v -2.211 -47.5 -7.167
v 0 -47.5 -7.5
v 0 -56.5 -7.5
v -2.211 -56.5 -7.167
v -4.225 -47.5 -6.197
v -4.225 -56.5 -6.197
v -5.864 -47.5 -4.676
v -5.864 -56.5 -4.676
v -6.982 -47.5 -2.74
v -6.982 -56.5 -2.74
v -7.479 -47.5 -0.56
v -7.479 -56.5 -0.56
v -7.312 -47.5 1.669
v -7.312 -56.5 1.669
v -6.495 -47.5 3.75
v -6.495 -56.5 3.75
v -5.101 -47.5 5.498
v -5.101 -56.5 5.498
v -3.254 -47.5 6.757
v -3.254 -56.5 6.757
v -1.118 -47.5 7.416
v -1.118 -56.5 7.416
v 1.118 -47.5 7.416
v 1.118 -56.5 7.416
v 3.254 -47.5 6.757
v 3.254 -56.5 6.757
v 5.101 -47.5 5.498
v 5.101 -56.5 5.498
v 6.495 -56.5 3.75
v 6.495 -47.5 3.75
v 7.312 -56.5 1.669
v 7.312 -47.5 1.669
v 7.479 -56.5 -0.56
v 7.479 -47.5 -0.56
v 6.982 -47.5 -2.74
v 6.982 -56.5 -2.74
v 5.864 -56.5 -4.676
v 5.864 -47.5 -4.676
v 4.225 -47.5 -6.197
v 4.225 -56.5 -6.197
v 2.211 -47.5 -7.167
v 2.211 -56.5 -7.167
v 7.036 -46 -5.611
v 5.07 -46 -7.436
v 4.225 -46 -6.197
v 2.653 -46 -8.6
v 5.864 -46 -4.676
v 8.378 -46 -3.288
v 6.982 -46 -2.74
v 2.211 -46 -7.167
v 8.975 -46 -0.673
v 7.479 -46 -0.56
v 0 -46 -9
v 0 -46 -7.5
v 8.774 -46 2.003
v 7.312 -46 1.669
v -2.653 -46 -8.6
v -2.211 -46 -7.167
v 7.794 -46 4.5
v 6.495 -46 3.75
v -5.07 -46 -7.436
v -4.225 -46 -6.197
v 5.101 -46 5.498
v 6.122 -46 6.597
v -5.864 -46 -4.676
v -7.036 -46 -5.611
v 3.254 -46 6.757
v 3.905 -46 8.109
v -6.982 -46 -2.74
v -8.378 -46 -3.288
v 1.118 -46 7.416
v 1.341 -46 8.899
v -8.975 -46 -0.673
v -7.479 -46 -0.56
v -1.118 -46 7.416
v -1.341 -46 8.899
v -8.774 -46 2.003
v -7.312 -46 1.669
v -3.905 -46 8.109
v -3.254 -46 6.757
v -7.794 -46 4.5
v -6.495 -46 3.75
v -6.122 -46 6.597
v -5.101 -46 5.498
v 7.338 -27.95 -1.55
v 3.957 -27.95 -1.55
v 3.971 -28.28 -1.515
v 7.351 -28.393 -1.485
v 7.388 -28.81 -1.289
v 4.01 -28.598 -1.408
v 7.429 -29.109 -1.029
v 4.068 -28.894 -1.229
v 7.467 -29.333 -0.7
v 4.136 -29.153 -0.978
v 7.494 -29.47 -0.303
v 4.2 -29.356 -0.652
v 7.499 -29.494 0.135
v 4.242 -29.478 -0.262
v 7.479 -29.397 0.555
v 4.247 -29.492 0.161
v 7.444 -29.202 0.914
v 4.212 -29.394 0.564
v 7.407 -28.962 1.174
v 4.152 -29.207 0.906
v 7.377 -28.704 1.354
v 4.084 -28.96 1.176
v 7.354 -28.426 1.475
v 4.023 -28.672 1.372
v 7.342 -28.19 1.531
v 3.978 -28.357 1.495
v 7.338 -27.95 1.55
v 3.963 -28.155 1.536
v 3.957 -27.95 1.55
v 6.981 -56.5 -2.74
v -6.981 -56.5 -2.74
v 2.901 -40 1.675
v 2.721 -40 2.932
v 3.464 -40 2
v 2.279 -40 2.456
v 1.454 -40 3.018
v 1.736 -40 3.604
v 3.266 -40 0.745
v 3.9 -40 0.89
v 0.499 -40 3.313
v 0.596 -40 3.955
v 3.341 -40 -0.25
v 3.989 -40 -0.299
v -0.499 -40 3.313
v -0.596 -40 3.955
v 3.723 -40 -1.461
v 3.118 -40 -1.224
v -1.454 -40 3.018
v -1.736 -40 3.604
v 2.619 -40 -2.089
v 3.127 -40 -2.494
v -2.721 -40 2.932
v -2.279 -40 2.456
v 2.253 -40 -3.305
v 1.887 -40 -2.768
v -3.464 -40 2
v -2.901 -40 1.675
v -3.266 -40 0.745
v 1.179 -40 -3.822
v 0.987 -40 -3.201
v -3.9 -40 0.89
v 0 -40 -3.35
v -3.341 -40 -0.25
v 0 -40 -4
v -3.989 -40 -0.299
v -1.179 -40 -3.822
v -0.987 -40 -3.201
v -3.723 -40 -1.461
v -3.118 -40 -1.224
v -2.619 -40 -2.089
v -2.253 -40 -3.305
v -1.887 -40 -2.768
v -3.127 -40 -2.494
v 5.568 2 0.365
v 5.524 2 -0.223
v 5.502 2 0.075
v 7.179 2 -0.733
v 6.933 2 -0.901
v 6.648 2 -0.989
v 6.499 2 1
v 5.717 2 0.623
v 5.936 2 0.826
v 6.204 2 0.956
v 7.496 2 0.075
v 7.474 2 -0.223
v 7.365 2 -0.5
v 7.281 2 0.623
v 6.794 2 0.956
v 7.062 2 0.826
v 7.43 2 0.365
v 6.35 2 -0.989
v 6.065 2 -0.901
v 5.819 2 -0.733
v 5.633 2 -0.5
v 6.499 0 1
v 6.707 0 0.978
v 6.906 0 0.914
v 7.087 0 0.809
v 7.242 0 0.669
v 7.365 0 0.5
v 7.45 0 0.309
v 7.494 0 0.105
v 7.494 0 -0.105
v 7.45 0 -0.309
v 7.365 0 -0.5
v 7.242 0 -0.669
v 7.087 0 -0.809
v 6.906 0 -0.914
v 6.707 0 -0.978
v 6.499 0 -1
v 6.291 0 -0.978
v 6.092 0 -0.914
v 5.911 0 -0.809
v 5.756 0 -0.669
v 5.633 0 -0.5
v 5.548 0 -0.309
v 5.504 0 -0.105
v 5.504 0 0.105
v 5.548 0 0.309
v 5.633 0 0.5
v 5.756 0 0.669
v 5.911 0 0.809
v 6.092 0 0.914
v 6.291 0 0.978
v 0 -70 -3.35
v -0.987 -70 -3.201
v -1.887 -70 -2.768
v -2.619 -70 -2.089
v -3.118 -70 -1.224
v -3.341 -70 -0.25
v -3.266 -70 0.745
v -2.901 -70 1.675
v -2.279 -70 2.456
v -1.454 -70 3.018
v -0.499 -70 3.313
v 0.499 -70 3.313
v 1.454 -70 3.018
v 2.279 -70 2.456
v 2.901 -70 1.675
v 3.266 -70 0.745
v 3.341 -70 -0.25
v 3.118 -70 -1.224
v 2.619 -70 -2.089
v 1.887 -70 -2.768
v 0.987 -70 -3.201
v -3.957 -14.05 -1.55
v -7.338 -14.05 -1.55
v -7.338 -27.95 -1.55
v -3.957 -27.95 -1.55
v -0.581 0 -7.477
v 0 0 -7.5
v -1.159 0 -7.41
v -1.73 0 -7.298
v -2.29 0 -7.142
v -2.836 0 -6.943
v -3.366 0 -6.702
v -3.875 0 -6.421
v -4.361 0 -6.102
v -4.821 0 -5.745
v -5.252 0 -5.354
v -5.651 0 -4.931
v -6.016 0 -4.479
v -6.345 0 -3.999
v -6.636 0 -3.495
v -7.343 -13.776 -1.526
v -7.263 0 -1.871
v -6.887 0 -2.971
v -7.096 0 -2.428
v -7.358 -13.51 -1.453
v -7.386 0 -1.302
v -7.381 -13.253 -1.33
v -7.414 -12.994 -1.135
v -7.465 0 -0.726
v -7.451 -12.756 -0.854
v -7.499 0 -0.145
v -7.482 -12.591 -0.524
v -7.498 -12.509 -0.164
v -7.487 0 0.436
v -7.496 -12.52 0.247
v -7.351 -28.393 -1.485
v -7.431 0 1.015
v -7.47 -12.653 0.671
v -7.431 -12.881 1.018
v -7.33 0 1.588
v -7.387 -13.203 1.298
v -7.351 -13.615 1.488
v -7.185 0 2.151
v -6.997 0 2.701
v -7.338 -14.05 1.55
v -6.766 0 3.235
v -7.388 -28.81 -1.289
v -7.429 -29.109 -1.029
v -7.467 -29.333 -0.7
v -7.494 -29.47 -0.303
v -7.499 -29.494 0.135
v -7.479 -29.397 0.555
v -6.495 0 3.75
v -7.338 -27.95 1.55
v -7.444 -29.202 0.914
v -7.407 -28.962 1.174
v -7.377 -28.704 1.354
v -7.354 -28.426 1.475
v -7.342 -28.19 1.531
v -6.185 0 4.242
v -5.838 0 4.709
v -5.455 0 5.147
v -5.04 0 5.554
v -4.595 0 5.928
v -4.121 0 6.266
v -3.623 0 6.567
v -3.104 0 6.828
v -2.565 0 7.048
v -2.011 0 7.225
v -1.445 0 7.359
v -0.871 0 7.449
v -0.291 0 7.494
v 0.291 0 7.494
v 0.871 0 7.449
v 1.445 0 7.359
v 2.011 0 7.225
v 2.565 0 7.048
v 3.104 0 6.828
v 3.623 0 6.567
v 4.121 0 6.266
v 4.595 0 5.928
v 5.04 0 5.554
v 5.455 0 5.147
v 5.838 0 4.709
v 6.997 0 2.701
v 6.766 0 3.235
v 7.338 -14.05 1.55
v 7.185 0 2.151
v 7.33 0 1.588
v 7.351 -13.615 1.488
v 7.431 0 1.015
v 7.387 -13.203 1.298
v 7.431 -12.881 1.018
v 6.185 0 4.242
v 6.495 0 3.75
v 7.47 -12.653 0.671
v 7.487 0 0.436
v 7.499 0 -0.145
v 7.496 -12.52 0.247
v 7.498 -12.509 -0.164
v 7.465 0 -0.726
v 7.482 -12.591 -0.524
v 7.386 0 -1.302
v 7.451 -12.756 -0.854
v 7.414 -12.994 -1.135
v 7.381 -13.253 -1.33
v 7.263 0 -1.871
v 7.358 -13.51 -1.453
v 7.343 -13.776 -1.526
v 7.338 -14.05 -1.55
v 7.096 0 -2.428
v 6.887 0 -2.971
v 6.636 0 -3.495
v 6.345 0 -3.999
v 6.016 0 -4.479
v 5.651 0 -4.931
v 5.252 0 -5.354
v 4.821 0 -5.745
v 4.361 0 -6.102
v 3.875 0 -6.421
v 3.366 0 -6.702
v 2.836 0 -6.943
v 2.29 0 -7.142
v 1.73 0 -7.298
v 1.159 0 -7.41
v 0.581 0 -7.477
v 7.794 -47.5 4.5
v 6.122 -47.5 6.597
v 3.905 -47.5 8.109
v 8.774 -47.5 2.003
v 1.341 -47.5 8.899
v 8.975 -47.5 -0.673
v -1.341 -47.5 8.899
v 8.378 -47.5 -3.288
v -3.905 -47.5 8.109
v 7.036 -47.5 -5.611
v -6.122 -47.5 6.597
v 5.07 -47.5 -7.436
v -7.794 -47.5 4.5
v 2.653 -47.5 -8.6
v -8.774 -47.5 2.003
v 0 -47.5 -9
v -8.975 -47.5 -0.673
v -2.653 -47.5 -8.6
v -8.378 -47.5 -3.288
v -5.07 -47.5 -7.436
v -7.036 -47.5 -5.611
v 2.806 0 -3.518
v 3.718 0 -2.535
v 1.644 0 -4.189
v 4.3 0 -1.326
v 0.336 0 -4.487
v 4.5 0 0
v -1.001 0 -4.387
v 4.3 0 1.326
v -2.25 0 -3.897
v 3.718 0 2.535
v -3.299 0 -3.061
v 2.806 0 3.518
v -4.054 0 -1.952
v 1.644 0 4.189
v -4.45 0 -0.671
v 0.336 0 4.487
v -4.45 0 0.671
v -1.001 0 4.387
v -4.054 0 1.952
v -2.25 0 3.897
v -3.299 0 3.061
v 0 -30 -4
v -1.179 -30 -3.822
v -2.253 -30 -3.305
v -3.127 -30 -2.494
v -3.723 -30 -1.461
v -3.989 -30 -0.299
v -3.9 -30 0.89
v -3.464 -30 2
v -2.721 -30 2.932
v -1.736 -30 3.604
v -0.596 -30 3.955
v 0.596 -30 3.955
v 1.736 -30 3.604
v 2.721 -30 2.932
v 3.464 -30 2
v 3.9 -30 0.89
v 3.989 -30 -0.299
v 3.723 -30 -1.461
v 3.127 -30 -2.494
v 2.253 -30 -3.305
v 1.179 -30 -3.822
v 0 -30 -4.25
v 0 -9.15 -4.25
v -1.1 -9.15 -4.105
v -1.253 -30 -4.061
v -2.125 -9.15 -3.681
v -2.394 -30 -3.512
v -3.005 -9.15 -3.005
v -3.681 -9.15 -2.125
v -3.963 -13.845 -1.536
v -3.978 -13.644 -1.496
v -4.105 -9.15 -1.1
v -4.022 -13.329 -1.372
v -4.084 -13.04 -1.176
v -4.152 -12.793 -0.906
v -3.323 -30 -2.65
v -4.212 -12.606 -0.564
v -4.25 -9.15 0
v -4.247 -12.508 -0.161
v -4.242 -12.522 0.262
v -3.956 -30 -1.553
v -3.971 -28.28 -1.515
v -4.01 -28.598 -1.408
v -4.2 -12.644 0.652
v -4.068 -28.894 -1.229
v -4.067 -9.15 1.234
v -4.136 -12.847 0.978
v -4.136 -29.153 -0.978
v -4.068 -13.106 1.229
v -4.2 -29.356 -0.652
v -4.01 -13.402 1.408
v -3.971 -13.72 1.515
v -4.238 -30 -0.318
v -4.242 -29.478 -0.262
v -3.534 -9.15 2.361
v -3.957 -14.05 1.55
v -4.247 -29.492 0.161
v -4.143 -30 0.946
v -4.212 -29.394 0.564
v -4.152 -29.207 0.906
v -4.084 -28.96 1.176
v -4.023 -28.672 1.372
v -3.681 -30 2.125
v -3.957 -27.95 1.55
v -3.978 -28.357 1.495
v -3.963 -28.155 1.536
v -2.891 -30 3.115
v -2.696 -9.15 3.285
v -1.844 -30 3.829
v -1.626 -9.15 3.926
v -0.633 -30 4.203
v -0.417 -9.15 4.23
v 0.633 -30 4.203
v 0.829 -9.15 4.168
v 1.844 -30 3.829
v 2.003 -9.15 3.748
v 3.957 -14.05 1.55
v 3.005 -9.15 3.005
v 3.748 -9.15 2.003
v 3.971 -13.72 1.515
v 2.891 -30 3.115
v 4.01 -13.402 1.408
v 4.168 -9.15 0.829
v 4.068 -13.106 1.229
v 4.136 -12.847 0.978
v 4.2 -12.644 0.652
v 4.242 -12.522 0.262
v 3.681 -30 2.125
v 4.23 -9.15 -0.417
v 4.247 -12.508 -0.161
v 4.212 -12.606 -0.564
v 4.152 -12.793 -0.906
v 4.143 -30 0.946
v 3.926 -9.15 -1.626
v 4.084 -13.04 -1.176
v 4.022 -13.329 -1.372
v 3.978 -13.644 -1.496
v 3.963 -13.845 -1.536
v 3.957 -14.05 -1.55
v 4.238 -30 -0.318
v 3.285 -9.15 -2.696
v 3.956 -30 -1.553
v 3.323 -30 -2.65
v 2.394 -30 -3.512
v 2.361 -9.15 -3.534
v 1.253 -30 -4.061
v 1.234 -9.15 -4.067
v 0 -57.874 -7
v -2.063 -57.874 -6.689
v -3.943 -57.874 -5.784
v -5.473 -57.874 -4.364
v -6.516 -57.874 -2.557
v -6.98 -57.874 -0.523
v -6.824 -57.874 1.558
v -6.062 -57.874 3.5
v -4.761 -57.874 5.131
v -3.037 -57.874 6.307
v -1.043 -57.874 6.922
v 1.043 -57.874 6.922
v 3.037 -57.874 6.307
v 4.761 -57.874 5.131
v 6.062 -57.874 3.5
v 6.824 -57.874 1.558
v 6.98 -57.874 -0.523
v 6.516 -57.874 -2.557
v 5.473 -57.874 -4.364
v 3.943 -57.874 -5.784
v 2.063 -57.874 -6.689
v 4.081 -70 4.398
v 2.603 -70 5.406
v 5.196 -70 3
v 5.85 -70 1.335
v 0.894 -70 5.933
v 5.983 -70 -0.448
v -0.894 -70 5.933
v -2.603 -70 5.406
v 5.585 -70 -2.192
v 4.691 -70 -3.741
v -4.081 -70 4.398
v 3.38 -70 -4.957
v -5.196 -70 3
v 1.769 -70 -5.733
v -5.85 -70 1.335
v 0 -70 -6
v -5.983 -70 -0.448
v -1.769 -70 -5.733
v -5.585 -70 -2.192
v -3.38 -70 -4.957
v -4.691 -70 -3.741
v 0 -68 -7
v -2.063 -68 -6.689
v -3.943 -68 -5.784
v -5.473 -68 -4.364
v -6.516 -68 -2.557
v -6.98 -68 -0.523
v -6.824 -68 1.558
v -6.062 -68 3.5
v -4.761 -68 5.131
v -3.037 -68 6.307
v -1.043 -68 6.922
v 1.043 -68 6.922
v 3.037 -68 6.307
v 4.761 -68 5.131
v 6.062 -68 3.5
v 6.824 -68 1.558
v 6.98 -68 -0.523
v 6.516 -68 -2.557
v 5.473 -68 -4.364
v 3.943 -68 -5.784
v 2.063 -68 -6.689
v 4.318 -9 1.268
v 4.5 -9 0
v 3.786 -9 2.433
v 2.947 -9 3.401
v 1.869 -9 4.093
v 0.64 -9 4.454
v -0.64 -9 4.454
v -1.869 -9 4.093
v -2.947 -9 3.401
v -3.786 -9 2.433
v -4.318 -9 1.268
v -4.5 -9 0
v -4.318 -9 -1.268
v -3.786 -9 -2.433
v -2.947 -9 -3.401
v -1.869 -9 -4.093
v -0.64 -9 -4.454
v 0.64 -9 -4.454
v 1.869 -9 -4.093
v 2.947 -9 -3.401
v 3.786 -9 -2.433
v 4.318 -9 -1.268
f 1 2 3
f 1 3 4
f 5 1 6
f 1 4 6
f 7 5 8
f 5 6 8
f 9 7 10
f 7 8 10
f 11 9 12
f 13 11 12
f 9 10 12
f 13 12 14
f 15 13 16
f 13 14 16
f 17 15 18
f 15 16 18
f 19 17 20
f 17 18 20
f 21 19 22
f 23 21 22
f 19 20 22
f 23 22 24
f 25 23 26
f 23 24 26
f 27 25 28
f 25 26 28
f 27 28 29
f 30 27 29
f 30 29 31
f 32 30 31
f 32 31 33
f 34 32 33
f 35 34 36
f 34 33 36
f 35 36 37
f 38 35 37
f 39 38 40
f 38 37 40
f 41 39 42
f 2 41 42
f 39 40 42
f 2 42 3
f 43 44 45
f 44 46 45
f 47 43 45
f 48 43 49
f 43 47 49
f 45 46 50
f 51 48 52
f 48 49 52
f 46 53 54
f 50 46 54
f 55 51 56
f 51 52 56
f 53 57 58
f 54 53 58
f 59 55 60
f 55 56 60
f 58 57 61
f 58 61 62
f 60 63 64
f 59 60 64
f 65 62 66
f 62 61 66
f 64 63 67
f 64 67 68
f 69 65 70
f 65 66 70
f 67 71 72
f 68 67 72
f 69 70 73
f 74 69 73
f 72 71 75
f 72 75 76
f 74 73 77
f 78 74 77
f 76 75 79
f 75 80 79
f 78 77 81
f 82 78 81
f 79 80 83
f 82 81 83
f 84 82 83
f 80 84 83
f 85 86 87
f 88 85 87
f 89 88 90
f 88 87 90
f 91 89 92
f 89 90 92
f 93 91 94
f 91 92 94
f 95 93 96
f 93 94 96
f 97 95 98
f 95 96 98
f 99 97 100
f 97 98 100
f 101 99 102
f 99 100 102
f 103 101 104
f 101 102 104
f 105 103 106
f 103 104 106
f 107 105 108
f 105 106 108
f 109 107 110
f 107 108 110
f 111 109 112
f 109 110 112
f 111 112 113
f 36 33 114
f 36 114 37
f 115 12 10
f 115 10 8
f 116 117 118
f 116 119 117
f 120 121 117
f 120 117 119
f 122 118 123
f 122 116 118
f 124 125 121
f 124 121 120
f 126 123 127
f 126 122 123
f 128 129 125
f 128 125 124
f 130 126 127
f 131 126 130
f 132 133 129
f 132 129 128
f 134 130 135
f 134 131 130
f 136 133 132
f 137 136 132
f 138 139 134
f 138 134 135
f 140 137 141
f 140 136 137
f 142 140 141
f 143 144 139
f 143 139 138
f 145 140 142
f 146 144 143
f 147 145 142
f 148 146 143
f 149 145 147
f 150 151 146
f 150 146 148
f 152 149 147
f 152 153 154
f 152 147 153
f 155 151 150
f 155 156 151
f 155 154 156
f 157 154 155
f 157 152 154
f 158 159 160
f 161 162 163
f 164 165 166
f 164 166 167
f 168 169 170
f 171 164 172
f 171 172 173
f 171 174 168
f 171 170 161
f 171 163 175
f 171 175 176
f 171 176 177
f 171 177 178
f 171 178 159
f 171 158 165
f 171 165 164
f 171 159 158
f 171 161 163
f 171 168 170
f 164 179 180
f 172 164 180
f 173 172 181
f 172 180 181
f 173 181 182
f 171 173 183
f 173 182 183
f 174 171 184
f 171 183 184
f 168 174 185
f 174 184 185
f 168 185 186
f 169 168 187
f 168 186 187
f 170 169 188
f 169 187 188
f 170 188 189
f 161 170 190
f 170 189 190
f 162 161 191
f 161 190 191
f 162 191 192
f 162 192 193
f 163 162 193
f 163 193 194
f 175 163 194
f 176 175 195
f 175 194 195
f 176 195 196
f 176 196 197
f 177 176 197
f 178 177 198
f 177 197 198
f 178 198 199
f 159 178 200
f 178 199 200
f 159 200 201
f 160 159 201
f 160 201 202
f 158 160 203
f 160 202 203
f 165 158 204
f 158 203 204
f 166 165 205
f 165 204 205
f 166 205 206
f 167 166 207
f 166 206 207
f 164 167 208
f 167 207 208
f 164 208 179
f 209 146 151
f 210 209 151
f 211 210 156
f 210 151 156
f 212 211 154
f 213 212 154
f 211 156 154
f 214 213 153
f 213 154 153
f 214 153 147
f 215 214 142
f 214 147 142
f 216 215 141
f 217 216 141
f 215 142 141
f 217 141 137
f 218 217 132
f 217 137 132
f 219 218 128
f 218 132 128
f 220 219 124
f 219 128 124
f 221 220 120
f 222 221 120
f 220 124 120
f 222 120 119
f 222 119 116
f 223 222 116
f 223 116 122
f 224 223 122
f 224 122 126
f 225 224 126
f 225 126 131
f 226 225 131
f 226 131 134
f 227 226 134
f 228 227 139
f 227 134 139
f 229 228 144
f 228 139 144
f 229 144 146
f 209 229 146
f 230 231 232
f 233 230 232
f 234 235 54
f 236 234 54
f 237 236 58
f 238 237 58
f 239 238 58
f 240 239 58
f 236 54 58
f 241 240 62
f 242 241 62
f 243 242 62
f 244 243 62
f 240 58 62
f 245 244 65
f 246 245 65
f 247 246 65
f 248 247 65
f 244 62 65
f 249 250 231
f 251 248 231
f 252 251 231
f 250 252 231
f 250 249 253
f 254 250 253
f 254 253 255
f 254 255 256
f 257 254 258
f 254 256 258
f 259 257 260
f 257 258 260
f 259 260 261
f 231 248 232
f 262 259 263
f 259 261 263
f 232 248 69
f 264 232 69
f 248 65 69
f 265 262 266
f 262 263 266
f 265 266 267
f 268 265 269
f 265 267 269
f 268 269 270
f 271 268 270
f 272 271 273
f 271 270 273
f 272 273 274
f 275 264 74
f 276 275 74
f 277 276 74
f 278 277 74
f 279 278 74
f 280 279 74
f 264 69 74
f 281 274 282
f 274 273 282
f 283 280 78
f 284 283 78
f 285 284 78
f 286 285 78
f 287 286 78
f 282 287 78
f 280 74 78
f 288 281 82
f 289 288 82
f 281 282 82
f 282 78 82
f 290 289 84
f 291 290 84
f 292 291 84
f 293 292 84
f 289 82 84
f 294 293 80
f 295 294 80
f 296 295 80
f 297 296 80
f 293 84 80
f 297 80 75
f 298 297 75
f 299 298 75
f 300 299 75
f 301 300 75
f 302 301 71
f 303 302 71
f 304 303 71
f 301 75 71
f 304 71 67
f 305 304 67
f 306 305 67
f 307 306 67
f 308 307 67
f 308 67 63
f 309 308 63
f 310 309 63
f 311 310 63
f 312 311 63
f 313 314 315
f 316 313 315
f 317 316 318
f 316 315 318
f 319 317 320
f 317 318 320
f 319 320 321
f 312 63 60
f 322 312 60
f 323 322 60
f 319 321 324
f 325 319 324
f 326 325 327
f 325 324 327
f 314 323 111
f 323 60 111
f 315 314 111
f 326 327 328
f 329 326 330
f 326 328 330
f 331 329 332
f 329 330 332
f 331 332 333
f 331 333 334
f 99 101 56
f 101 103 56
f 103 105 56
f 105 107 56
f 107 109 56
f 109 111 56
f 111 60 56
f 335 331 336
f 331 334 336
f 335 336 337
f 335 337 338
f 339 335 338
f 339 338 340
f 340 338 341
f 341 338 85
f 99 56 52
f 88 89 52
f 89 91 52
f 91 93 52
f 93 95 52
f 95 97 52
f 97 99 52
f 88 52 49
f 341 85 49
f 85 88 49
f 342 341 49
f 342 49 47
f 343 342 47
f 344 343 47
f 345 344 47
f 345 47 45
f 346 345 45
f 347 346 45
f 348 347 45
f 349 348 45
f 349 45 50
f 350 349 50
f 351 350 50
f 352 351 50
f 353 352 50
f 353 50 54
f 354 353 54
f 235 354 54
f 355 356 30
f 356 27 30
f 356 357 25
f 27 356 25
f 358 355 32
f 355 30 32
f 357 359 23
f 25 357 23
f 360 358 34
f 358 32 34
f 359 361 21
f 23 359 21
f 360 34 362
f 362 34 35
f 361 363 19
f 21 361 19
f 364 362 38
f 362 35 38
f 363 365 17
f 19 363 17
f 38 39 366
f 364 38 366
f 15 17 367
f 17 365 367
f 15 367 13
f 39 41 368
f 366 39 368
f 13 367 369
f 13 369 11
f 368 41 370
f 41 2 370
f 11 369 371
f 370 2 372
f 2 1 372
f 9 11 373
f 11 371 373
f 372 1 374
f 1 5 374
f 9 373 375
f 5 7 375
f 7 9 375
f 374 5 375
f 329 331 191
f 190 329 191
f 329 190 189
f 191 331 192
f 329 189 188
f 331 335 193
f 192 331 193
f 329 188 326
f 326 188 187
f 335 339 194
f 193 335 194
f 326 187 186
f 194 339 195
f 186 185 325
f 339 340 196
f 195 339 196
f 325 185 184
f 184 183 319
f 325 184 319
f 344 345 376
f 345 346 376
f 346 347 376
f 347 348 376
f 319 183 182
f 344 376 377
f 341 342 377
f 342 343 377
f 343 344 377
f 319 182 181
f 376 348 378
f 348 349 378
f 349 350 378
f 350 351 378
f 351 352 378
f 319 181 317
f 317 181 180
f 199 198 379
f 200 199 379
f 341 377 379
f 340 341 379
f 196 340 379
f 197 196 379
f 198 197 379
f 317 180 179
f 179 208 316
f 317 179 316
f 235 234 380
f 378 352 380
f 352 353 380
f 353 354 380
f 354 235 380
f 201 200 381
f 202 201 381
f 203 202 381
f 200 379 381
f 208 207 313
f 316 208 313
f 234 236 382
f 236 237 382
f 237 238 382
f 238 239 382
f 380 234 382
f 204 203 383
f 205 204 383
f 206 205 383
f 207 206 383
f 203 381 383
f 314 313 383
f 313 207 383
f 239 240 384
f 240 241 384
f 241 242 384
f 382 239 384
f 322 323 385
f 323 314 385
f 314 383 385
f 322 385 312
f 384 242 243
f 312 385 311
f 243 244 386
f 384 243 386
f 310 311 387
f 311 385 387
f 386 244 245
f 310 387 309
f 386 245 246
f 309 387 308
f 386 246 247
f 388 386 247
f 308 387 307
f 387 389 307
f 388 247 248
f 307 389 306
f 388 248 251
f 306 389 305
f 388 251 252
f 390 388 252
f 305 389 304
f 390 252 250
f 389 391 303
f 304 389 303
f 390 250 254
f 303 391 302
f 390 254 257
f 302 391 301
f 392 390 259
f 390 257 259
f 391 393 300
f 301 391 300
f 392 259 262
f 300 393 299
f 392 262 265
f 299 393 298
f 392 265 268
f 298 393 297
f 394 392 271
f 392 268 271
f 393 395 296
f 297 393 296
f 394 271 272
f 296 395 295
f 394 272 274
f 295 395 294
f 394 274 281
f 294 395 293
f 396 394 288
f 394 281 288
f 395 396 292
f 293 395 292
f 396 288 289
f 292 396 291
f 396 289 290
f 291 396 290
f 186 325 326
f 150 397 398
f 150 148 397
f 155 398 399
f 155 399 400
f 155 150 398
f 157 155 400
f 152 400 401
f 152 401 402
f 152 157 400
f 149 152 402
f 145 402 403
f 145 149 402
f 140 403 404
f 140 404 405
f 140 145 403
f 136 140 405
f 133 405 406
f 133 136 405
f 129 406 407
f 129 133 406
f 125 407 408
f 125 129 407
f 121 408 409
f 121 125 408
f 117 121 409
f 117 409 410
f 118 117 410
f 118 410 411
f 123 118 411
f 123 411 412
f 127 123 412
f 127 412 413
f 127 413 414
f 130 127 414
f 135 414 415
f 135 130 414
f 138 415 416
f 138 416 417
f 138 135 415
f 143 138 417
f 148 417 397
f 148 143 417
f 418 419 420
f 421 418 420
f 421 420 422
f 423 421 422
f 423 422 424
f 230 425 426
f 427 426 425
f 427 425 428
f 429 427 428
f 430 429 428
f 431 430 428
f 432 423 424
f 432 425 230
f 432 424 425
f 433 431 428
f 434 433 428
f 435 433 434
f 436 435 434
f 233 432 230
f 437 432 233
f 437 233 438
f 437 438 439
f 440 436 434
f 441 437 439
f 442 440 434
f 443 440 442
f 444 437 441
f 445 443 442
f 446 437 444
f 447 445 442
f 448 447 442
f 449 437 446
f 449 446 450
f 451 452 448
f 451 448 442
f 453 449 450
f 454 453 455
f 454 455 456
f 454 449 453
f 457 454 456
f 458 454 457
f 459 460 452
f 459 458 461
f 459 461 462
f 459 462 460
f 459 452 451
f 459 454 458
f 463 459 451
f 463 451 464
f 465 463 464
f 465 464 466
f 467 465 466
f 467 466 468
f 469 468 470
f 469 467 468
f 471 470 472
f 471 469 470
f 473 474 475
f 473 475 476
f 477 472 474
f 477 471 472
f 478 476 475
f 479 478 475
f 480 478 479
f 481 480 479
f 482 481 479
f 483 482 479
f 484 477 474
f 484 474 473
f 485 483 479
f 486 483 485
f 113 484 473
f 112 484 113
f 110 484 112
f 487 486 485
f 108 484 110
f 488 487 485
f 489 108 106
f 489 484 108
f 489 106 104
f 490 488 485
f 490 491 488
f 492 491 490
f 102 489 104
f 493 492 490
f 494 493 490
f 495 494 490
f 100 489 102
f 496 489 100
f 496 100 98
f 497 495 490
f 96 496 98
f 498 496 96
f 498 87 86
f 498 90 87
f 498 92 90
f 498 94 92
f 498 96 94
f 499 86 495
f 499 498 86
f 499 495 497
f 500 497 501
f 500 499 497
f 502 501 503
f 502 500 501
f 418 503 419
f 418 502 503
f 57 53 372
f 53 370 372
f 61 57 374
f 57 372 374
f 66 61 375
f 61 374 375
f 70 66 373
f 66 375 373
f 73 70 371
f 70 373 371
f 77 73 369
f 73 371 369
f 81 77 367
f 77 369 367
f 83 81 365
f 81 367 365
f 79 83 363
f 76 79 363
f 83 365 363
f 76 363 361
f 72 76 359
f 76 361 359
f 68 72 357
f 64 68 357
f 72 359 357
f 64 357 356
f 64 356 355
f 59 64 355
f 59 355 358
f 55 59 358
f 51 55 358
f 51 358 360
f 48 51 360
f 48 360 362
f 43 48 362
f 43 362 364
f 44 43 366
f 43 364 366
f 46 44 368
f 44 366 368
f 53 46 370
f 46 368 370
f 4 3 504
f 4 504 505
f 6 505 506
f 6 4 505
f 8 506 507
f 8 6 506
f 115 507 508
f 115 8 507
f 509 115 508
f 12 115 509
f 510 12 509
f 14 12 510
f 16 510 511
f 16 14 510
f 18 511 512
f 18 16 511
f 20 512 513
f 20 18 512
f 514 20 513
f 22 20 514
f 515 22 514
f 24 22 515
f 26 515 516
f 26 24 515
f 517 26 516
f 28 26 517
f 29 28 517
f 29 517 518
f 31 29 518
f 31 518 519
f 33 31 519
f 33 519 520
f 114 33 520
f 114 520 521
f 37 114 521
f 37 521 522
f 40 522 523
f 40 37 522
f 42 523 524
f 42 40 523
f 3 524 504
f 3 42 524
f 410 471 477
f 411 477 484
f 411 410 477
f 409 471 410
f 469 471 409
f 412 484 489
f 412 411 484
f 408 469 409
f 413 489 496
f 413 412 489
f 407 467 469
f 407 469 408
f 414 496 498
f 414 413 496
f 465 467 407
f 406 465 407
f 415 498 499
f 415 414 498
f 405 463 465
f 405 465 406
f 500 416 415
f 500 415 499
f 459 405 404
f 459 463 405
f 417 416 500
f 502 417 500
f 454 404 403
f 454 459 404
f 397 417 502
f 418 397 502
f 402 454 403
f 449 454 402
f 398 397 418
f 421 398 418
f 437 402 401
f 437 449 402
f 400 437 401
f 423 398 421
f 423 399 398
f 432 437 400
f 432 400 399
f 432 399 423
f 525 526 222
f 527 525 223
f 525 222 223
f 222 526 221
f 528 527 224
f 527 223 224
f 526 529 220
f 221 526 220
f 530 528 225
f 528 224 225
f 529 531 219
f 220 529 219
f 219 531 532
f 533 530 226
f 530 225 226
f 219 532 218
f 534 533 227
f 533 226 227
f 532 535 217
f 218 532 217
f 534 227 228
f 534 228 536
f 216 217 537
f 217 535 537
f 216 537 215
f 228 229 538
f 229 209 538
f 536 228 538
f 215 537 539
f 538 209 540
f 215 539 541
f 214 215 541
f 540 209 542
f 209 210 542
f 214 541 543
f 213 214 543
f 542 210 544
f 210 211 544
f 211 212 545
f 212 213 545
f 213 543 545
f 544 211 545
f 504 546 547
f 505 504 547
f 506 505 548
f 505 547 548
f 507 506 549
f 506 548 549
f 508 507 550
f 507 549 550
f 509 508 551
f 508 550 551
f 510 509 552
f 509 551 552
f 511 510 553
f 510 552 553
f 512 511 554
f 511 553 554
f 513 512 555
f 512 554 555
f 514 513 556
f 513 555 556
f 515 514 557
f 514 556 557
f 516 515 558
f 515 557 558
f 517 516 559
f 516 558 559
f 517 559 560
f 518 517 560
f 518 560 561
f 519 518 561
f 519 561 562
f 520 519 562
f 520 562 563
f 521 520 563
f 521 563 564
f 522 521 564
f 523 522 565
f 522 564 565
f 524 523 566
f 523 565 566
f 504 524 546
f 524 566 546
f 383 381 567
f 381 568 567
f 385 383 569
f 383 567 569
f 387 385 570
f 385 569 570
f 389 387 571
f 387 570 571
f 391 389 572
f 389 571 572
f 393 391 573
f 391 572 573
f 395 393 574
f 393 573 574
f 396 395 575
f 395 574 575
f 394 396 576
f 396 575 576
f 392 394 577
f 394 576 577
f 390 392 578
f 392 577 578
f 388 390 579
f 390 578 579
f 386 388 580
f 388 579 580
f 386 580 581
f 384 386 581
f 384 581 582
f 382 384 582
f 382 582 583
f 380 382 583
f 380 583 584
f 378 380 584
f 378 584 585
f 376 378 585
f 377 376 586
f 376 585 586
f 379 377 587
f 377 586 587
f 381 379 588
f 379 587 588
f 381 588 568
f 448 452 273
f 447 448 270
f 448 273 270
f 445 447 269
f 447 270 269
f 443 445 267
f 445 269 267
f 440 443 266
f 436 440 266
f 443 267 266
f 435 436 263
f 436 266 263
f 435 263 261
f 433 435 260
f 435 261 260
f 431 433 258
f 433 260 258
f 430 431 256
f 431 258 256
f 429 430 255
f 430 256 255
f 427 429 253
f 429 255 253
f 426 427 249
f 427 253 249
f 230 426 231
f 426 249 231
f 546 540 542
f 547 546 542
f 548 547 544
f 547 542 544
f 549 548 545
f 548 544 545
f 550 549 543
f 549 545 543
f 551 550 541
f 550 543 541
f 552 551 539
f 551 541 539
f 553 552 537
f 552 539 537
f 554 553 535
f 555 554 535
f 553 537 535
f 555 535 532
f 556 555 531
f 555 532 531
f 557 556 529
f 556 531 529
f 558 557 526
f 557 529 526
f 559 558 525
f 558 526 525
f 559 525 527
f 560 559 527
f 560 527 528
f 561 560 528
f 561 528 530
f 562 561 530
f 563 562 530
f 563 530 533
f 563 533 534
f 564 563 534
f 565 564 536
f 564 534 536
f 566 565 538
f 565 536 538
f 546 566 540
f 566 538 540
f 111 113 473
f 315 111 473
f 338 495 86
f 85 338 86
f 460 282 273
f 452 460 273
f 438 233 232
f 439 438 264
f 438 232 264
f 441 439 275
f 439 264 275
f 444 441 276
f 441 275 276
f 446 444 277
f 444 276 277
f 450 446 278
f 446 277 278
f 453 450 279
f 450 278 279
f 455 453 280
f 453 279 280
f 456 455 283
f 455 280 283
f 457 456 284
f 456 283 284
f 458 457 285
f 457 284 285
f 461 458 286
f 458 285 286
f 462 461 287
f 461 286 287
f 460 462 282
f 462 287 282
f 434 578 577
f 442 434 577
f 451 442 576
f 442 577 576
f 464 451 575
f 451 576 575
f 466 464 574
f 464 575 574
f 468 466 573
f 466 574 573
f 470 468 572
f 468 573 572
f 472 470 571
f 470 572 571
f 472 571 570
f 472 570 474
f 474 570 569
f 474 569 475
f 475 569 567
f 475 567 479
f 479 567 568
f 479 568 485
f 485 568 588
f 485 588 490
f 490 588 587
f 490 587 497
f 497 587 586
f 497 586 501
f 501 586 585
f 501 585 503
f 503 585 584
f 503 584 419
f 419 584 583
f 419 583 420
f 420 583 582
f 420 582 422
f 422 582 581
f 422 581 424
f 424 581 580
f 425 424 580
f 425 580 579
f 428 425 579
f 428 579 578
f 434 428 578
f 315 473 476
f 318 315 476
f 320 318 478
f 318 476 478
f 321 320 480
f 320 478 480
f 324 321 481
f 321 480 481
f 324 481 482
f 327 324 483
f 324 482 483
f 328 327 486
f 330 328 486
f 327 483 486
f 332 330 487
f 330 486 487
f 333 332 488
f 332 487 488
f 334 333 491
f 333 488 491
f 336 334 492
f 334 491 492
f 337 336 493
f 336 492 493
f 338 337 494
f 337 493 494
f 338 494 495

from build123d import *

# Parameters (mm, degrees)
SKETCH6_R                  = 1
BOSS_EXTRUDE1_DEPTH        = 2
CUT_EXTRUDE1_DEPTH         = 72.147733625
CUT_EXTRUDE1_DEPTH_BACK    = 72.147733625
M10X1_0_TAPPED_HOLE1_D     = 9
M10X1_0_TAPPED_HOLE1_DEPTH = 9
M10X1_0_TAPPED_HOLE1_TIP   = 2.703872786
CHAMFER1_SIZE              = 2
CHAMFER1_SIZE2             = 1
CHAMFER2_SIZE2             = 0.5
CHAMFER2_SIZE              = 1.37373871


with BuildPart() as part:
    # Sketch1 → Revolve1 (revolve)
    with BuildSketch(Plane.XY, mode=Mode.PRIVATE) as revolve1_sk:
        Polygon((7.5, 0), (7.5, -46), (9, -46), (9, -47.5), (7.5, -47.5), (7.5, -56.5), (7, -56.5), (7, -70), (3.35, -70), (3.35, 0), align=None)
    revolve(revolve1_sk.sketch.rotate(Axis((0, -80.784886464, 0), (0, 1, 0)), 90), axis=Axis((0, -80.784886464, 0), (0, 1, 0)))

    # Sketch6 → Boss-Extrude1 (add)
    with BuildSketch(Plane(origin=(0, 0, 0), x_dir=(1, 0, 0), z_dir=(0, 1, 0))):
        with Locations(Location((6.499, 0, 0), (0, 0, 270))):
            Circle(SKETCH6_R)
    extrude(amount=BOSS_EXTRUDE1_DEPTH)

    # Sketch2 → Cut-Revolve1 (revolve, cut)
    with BuildSketch(Plane.XY, mode=Mode.PRIVATE) as cut_revolve1_sk:
        Polygon((-3.35, 0), (-4.25, 0), (-4.25, -30), (-4, -30), (-4, -40), (-3.35, -40), align=None)
    revolve(cut_revolve1_sk.sketch.rotate(Axis((0, -73.381951652, 0), (0, 1, 0)), 270), axis=Axis((0, -73.381951652, 0), (0, 1, 0)), mode=Mode.SUBTRACT)

    # Sketch3 → Cut-Extrude1 (cut, two sides: drawn at the far end of the back side and taken through both)
    with BuildSketch(Plane(origin=(0, 0, 0), x_dir=(0, 0, -1), z_dir=(1, 0, 0)).offset(-CUT_EXTRUDE1_DEPTH_BACK)):
        with BuildLine():
            Line((-1.55, -27.95), (-1.55, -14.05))
            ThreePointArc((-1.55, -14.05), (0, -12.5), (1.55, -14.05))
            Line((1.55, -14.05), (1.55, -27.95))
            ThreePointArc((1.55, -27.95), (0, -29.5), (-1.55, -27.95))
        make_face()
    extrude(amount=CUT_EXTRUDE1_DEPTH + CUT_EXTRUDE1_DEPTH_BACK, mode=Mode.SUBTRACT)

    # M10x1.0 Tapped Hole1
    with Locations(Plane(origin=(0, 0, 0), x_dir=(-1, 0, 0), z_dir=(0, 1, 0))):
        with Locations((0, 0)):
            Hole(M10X1_0_TAPPED_HOLE1_D / 2, depth=M10X1_0_TAPPED_HOLE1_DEPTH)
            with Locations((0, 0, -(M10X1_0_TAPPED_HOLE1_DEPTH + M10X1_0_TAPPED_HOLE1_TIP / 2))):  # 118° drill point
                Cone(0, M10X1_0_TAPPED_HOLE1_D / 2, M10X1_0_TAPPED_HOLE1_TIP, mode=Mode.SUBTRACT)

    # Chamfer1
    chamfer1_edges = [part.edges().sort_by_distance(p)[0] for p in [
        (0, -70, 7),
    ]]
    chamfer1_side = [part.faces().sort_by_distance(p)[0] for p in [
        (0, -63.25, 7),
    ]]
    chamfer(chamfer1_edges, length=CHAMFER1_SIZE, length2=CHAMFER1_SIZE2, reference=chamfer1_side[0])

    # Chamfer2
    chamfer2_edges = [part.edges().sort_by_distance(p)[0] for p in [
        (0, -56.5, 7),
    ]]
    chamfer2_side = [part.faces().sort_by_distance(p)[0] for p in [
        (0, -56.51, 7),
    ]]
    chamfer(chamfer2_edges, length=CHAMFER2_SIZE - 0.0001, length2=CHAMFER2_SIZE2 - 0.0001, reference=chamfer2_side[0])  # a hair under: the kernel refuses the full size


solid = part.part
